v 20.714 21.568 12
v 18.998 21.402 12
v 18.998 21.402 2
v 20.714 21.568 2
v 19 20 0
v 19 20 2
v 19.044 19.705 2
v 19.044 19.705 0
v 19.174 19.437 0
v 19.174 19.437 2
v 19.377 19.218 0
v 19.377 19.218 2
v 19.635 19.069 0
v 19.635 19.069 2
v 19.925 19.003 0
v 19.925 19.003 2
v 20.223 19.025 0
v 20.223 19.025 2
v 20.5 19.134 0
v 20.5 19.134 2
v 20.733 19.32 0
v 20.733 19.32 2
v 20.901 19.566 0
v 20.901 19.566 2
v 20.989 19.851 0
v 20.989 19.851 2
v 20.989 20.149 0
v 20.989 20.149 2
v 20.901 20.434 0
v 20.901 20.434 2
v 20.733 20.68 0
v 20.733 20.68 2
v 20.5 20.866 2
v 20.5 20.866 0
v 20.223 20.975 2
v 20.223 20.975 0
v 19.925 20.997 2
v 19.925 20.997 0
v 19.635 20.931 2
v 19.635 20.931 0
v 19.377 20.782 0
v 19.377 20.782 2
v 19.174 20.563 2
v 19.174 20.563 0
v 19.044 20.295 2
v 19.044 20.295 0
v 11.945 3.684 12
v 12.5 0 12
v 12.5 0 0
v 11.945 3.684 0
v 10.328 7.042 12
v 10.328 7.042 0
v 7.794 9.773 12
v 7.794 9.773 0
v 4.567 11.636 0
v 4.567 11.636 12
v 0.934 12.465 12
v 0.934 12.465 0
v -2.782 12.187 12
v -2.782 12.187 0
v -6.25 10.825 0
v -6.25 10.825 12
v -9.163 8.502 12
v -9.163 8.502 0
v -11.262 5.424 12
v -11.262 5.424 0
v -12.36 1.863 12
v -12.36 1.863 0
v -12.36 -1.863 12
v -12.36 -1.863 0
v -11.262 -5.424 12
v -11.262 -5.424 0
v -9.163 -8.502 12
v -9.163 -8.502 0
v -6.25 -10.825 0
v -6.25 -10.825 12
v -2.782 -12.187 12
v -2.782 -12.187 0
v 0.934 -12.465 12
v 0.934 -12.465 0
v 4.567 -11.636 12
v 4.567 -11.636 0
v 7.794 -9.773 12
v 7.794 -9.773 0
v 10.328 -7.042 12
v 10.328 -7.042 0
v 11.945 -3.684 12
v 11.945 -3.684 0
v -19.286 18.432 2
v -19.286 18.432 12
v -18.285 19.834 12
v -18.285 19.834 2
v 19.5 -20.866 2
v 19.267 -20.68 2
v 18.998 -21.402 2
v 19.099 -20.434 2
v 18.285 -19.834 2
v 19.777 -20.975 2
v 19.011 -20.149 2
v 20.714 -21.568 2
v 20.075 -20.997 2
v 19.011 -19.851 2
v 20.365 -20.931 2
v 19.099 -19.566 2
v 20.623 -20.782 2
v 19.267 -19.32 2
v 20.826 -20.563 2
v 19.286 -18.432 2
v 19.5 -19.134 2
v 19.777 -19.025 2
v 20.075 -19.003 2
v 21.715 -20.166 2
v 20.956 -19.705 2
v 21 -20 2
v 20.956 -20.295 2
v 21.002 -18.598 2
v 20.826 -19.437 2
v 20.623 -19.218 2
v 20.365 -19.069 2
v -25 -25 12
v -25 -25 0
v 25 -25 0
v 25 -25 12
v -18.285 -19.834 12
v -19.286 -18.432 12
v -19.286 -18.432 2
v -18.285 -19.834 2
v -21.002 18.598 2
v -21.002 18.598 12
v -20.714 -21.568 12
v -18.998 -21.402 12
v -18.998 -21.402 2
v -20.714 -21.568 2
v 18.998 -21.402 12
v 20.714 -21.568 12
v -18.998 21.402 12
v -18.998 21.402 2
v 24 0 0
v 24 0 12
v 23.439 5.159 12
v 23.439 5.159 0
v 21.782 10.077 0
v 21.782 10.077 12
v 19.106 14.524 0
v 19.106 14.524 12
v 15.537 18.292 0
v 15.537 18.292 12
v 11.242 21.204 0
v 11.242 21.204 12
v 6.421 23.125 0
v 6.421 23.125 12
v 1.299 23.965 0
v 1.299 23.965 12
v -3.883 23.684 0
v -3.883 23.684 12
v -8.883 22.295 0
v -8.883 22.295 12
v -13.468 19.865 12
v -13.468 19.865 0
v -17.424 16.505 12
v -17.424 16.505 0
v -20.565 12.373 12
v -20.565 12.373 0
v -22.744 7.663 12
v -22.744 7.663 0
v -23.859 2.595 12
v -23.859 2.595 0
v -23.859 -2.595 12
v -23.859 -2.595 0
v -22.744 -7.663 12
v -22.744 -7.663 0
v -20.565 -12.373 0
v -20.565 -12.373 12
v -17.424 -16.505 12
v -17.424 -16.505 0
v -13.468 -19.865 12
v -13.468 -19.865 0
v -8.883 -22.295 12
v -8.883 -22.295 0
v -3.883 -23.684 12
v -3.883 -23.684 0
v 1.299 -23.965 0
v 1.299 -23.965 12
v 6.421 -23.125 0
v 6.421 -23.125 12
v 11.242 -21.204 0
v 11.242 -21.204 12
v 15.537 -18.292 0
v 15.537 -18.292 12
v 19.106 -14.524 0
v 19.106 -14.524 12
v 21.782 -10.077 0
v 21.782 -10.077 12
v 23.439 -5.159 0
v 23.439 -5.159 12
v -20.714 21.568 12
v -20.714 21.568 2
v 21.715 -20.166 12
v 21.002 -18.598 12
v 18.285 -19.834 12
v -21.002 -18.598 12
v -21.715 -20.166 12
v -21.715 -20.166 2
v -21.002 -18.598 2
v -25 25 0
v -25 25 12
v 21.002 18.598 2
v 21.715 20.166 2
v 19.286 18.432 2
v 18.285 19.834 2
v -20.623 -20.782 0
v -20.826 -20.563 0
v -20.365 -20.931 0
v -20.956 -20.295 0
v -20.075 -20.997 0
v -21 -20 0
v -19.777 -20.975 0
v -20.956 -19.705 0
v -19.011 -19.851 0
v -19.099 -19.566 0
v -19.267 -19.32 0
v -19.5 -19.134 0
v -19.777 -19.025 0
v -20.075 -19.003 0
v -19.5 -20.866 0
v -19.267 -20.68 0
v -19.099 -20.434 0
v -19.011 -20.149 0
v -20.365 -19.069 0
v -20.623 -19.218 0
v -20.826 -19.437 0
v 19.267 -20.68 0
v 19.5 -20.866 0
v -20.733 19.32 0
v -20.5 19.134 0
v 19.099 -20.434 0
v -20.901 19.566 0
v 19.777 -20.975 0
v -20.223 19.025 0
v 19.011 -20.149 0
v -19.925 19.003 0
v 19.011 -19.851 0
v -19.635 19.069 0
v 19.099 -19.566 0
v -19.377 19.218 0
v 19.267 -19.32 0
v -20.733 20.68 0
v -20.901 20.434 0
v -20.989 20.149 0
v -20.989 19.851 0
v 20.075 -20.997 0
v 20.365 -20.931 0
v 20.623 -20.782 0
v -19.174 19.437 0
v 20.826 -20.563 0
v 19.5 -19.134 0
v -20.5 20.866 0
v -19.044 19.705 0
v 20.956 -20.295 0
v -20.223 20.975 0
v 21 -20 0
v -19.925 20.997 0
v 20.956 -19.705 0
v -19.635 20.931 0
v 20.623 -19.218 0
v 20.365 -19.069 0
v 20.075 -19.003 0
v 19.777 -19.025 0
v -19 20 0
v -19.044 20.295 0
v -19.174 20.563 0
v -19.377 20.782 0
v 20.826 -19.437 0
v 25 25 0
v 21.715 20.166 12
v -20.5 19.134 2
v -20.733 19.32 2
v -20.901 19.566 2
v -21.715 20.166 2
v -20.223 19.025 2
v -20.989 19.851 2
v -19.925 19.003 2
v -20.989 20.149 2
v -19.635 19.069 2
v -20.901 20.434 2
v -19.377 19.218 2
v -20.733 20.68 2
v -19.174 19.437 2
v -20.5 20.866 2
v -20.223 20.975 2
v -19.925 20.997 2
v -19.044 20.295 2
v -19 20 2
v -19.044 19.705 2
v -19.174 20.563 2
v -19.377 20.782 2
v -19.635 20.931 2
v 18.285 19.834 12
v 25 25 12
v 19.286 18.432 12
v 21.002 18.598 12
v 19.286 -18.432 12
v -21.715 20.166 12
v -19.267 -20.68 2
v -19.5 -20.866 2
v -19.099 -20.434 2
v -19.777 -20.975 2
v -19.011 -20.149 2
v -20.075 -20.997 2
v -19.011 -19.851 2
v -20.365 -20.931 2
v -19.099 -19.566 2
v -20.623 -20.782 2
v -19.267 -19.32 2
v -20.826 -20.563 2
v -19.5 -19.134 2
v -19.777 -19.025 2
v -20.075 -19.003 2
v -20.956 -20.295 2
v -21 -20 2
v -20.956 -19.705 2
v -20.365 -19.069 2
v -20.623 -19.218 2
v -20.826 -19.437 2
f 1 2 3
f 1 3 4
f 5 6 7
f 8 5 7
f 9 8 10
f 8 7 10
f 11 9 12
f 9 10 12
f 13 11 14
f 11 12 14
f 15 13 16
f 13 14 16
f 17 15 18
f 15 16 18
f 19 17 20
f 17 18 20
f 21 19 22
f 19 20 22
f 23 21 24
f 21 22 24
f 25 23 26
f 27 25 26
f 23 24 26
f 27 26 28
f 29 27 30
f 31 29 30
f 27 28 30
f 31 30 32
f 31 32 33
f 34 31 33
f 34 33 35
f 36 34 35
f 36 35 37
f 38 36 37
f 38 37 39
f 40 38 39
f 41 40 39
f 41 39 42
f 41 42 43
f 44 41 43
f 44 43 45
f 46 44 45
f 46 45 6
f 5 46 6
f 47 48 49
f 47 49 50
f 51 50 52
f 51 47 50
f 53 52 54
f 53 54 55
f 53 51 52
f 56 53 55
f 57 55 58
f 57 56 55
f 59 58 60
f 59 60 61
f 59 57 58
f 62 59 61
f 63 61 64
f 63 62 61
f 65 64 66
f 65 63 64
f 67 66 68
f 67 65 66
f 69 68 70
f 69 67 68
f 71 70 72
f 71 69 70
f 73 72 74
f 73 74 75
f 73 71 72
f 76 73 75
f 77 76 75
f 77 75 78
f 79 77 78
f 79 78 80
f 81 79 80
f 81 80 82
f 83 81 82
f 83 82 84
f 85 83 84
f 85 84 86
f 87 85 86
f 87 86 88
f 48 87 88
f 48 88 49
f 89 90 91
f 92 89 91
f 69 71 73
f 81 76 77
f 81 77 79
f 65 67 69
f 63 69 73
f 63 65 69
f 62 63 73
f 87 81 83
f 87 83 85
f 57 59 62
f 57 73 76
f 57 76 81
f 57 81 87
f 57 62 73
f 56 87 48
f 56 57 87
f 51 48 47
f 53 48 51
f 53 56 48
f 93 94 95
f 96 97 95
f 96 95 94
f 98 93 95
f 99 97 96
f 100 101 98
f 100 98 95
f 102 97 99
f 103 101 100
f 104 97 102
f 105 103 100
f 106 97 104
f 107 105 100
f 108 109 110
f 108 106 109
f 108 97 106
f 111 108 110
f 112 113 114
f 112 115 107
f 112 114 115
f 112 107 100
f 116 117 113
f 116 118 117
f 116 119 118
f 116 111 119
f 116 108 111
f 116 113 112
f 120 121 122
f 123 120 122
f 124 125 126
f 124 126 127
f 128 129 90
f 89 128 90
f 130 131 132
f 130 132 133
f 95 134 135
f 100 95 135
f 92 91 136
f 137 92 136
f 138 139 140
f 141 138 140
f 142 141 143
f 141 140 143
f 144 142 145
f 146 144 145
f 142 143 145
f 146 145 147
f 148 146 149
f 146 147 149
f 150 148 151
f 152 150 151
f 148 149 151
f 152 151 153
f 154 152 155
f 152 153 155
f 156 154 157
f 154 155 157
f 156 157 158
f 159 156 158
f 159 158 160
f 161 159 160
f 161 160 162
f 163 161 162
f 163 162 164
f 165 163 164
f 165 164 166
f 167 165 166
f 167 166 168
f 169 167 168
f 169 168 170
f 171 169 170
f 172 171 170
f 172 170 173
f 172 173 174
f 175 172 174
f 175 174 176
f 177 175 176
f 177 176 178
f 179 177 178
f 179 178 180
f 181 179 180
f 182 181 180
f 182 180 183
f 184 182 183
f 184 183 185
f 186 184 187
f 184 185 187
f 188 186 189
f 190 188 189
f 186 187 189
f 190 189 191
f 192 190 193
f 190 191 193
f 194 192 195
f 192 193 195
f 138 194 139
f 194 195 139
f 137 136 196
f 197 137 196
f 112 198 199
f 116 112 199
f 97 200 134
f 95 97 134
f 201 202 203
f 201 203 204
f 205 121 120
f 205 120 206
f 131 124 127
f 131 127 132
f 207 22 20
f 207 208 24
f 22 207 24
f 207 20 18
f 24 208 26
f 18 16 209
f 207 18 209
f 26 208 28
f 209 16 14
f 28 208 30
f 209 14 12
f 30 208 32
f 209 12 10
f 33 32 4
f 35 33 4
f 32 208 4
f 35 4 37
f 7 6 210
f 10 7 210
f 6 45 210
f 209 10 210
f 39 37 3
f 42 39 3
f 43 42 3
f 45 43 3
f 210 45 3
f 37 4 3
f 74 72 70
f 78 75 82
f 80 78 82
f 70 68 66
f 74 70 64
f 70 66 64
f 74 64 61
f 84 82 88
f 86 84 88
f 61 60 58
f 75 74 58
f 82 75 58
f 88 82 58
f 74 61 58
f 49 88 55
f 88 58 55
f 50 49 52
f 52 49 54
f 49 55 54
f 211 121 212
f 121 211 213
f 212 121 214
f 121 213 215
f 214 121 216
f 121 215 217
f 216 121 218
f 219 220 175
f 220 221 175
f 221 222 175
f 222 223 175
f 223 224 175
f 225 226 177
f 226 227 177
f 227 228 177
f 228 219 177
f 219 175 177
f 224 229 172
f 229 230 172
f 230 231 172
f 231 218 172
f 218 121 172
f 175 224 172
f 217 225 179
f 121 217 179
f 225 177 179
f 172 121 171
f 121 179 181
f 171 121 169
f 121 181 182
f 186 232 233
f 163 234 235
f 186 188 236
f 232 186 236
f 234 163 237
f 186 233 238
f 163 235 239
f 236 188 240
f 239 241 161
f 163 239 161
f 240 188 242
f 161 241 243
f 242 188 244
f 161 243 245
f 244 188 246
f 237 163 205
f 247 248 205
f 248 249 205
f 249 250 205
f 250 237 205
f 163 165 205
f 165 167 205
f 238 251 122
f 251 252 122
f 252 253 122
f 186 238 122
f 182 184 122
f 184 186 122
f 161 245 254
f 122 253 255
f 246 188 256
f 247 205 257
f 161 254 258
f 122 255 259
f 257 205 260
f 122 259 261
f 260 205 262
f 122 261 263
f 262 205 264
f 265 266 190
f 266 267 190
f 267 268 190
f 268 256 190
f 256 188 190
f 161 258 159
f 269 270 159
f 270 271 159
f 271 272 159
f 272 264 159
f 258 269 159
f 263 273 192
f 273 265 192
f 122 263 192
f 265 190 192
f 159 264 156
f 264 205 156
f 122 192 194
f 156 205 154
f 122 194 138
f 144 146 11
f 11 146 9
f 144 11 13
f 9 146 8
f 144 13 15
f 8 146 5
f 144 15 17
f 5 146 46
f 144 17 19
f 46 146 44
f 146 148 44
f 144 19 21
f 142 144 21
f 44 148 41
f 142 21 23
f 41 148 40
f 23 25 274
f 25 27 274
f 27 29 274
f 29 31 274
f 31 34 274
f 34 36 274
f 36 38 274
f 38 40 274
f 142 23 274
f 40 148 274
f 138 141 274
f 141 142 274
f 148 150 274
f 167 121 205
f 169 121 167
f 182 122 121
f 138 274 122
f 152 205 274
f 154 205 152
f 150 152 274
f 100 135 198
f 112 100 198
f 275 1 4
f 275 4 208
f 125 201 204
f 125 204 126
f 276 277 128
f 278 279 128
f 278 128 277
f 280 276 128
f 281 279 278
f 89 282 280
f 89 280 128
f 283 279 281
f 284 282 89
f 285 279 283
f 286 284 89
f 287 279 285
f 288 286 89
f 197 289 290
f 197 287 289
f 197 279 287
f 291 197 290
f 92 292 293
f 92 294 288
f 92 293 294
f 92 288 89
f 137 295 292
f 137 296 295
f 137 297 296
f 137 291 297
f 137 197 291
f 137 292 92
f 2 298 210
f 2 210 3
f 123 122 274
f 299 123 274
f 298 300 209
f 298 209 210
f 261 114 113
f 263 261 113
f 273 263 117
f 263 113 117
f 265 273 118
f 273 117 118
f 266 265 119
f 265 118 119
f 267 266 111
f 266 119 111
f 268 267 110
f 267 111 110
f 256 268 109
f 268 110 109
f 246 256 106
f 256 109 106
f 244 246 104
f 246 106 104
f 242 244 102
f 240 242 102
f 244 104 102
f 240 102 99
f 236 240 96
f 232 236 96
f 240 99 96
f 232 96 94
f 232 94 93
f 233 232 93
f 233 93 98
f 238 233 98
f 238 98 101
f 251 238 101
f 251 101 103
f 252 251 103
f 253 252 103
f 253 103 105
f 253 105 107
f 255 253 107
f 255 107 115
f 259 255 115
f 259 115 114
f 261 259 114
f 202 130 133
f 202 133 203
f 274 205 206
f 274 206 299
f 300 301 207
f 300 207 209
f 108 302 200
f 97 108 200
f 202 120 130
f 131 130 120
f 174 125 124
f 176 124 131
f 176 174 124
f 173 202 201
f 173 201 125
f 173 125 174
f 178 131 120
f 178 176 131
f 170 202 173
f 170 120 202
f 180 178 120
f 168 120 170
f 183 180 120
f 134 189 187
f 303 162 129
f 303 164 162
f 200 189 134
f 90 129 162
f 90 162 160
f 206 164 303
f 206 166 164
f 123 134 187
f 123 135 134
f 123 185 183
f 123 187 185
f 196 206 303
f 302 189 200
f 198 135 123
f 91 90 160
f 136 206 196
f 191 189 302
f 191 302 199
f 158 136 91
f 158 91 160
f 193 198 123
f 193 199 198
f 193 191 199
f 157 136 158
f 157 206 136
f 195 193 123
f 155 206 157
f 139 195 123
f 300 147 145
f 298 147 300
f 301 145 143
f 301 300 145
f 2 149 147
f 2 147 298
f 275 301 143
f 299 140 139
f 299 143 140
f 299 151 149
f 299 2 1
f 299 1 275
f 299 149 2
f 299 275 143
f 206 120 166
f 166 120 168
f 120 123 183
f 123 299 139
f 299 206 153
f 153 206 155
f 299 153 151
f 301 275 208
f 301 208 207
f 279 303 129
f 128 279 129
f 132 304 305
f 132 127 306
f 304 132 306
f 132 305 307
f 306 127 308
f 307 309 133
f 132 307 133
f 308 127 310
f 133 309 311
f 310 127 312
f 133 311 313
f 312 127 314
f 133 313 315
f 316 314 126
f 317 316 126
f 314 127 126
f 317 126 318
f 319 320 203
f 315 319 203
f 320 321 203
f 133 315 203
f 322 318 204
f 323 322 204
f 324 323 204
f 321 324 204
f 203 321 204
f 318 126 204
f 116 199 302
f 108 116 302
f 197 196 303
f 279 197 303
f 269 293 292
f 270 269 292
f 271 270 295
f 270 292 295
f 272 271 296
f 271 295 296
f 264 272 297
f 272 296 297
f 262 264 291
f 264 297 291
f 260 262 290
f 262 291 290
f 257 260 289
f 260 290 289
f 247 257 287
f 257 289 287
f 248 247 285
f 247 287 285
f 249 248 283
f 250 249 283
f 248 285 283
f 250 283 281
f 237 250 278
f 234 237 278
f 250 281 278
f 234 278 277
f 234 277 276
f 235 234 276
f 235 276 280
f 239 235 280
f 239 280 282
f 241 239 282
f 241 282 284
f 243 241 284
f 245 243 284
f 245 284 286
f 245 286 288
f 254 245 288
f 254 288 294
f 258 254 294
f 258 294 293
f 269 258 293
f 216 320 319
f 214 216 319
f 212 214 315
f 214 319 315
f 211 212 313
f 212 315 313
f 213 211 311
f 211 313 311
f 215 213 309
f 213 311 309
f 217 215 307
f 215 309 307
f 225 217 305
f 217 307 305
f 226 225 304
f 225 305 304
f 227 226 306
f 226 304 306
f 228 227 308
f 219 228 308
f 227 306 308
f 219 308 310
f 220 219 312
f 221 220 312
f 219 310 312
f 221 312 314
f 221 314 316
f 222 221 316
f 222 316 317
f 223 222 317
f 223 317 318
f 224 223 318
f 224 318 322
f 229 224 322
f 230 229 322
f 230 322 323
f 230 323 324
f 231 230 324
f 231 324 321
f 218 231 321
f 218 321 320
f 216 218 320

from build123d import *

# Parameters (mm, degrees)
SKETCH_1_W          = 50
SKETCH_1_H          = 50
EXTRUDE_1_DEPTH     = 12
SKETCH_2_R          = 24
SKETCH_2_R_2        = 12.5
CUT_EXTRUDE_1_DEPTH = 38.336309405
CUT_EXTRUDE_2_DEPTH = 10
SKETCH_4_R          = 1
CUT_EXTRUDE_3_DEPTH = 38.336309405


with BuildPart() as part:
    # 草图1 → 凸台-拉伸1 (new body)
    with BuildSketch(Plane.XY):
        Rectangle(SKETCH_1_W, SKETCH_1_H)
    extrude(amount=EXTRUDE_1_DEPTH)

    # 草图2 → 切除-拉伸1 (cut, through all)
    with BuildSketch(Plane.XY.offset(12)):
        Circle(SKETCH_2_R)
        Circle(SKETCH_2_R_2, mode=Mode.SUBTRACT)
    extrude(amount=-CUT_EXTRUDE_1_DEPTH, mode=Mode.SUBTRACT)


with BuildPart() as cut_extrude_1_piece_1:
    # of the separate pieces the step leaves, piece 1, a body of its own (cut_extrude_1_pieces)
    add(part.part.solids().sort_by_distance((-25, 25, 0))[0])

    # 草图3 → 切除-拉伸2 (cut)
    with BuildSketch(Plane.XY.offset(12)):
        Polygon((-18.998434457, 21.40219176), (-20.713550914, 21.568477084), (-21.715116456, 20.166285324), (-21.001565543, 18.59780824), (-19.286449086, 18.431522916), (-18.284883544, 19.833714676), align=None)
        Polygon((-18.284883544, -19.833714676), (-18.998434457, -21.40219176), (-20.713550914, -21.568477084), (-21.715116456, -20.166285324), (-21.001565543, -18.59780824), (-19.286449086, -18.431522916), align=None)
        Polygon((18.998434457, -21.40219176), (20.713550914, -21.568477084), (21.715116456, -20.166285324), (21.001565543, -18.59780824), (19.286449086, -18.431522916), (18.284883544, -19.833714676), align=None)
        Polygon((18.284883544, 19.833714676), (18.998434457, 21.40219176), (20.713550914, 21.568477084), (21.715116456, 20.166285324), (21.001565543, 18.59780824), (19.286449086, 18.431522916), align=None)
    extrude(amount=-CUT_EXTRUDE_2_DEPTH, mode=Mode.SUBTRACT)

    # 草图4 → 切除-拉伸3 (cut, through all)
    with BuildSketch(Plane.XY.offset(12)):
        with Locations((-20, 20)):
            Circle(SKETCH_4_R)
        with Locations(Location((-20, -20, 0), (0, 0, 180))):
            Circle(SKETCH_4_R)
        with Locations((20, -20)):
            Circle(SKETCH_4_R)
        with Locations(Location((20, 20, 0), (0, 0, 180))):
            Circle(SKETCH_4_R)
    extrude(amount=-CUT_EXTRUDE_3_DEPTH, mode=Mode.SUBTRACT)


with BuildPart() as cut_extrude_1_piece_2:
    # of the separate pieces the step leaves, piece 2, a body of its own (cut_extrude_1_pieces)
    add(part.part.solids().sort_by_distance((12.5, 0, 0))[0])


solid = Compound([cut_extrude_1_piece_1.part, cut_extrude_1_piece_2.part])
